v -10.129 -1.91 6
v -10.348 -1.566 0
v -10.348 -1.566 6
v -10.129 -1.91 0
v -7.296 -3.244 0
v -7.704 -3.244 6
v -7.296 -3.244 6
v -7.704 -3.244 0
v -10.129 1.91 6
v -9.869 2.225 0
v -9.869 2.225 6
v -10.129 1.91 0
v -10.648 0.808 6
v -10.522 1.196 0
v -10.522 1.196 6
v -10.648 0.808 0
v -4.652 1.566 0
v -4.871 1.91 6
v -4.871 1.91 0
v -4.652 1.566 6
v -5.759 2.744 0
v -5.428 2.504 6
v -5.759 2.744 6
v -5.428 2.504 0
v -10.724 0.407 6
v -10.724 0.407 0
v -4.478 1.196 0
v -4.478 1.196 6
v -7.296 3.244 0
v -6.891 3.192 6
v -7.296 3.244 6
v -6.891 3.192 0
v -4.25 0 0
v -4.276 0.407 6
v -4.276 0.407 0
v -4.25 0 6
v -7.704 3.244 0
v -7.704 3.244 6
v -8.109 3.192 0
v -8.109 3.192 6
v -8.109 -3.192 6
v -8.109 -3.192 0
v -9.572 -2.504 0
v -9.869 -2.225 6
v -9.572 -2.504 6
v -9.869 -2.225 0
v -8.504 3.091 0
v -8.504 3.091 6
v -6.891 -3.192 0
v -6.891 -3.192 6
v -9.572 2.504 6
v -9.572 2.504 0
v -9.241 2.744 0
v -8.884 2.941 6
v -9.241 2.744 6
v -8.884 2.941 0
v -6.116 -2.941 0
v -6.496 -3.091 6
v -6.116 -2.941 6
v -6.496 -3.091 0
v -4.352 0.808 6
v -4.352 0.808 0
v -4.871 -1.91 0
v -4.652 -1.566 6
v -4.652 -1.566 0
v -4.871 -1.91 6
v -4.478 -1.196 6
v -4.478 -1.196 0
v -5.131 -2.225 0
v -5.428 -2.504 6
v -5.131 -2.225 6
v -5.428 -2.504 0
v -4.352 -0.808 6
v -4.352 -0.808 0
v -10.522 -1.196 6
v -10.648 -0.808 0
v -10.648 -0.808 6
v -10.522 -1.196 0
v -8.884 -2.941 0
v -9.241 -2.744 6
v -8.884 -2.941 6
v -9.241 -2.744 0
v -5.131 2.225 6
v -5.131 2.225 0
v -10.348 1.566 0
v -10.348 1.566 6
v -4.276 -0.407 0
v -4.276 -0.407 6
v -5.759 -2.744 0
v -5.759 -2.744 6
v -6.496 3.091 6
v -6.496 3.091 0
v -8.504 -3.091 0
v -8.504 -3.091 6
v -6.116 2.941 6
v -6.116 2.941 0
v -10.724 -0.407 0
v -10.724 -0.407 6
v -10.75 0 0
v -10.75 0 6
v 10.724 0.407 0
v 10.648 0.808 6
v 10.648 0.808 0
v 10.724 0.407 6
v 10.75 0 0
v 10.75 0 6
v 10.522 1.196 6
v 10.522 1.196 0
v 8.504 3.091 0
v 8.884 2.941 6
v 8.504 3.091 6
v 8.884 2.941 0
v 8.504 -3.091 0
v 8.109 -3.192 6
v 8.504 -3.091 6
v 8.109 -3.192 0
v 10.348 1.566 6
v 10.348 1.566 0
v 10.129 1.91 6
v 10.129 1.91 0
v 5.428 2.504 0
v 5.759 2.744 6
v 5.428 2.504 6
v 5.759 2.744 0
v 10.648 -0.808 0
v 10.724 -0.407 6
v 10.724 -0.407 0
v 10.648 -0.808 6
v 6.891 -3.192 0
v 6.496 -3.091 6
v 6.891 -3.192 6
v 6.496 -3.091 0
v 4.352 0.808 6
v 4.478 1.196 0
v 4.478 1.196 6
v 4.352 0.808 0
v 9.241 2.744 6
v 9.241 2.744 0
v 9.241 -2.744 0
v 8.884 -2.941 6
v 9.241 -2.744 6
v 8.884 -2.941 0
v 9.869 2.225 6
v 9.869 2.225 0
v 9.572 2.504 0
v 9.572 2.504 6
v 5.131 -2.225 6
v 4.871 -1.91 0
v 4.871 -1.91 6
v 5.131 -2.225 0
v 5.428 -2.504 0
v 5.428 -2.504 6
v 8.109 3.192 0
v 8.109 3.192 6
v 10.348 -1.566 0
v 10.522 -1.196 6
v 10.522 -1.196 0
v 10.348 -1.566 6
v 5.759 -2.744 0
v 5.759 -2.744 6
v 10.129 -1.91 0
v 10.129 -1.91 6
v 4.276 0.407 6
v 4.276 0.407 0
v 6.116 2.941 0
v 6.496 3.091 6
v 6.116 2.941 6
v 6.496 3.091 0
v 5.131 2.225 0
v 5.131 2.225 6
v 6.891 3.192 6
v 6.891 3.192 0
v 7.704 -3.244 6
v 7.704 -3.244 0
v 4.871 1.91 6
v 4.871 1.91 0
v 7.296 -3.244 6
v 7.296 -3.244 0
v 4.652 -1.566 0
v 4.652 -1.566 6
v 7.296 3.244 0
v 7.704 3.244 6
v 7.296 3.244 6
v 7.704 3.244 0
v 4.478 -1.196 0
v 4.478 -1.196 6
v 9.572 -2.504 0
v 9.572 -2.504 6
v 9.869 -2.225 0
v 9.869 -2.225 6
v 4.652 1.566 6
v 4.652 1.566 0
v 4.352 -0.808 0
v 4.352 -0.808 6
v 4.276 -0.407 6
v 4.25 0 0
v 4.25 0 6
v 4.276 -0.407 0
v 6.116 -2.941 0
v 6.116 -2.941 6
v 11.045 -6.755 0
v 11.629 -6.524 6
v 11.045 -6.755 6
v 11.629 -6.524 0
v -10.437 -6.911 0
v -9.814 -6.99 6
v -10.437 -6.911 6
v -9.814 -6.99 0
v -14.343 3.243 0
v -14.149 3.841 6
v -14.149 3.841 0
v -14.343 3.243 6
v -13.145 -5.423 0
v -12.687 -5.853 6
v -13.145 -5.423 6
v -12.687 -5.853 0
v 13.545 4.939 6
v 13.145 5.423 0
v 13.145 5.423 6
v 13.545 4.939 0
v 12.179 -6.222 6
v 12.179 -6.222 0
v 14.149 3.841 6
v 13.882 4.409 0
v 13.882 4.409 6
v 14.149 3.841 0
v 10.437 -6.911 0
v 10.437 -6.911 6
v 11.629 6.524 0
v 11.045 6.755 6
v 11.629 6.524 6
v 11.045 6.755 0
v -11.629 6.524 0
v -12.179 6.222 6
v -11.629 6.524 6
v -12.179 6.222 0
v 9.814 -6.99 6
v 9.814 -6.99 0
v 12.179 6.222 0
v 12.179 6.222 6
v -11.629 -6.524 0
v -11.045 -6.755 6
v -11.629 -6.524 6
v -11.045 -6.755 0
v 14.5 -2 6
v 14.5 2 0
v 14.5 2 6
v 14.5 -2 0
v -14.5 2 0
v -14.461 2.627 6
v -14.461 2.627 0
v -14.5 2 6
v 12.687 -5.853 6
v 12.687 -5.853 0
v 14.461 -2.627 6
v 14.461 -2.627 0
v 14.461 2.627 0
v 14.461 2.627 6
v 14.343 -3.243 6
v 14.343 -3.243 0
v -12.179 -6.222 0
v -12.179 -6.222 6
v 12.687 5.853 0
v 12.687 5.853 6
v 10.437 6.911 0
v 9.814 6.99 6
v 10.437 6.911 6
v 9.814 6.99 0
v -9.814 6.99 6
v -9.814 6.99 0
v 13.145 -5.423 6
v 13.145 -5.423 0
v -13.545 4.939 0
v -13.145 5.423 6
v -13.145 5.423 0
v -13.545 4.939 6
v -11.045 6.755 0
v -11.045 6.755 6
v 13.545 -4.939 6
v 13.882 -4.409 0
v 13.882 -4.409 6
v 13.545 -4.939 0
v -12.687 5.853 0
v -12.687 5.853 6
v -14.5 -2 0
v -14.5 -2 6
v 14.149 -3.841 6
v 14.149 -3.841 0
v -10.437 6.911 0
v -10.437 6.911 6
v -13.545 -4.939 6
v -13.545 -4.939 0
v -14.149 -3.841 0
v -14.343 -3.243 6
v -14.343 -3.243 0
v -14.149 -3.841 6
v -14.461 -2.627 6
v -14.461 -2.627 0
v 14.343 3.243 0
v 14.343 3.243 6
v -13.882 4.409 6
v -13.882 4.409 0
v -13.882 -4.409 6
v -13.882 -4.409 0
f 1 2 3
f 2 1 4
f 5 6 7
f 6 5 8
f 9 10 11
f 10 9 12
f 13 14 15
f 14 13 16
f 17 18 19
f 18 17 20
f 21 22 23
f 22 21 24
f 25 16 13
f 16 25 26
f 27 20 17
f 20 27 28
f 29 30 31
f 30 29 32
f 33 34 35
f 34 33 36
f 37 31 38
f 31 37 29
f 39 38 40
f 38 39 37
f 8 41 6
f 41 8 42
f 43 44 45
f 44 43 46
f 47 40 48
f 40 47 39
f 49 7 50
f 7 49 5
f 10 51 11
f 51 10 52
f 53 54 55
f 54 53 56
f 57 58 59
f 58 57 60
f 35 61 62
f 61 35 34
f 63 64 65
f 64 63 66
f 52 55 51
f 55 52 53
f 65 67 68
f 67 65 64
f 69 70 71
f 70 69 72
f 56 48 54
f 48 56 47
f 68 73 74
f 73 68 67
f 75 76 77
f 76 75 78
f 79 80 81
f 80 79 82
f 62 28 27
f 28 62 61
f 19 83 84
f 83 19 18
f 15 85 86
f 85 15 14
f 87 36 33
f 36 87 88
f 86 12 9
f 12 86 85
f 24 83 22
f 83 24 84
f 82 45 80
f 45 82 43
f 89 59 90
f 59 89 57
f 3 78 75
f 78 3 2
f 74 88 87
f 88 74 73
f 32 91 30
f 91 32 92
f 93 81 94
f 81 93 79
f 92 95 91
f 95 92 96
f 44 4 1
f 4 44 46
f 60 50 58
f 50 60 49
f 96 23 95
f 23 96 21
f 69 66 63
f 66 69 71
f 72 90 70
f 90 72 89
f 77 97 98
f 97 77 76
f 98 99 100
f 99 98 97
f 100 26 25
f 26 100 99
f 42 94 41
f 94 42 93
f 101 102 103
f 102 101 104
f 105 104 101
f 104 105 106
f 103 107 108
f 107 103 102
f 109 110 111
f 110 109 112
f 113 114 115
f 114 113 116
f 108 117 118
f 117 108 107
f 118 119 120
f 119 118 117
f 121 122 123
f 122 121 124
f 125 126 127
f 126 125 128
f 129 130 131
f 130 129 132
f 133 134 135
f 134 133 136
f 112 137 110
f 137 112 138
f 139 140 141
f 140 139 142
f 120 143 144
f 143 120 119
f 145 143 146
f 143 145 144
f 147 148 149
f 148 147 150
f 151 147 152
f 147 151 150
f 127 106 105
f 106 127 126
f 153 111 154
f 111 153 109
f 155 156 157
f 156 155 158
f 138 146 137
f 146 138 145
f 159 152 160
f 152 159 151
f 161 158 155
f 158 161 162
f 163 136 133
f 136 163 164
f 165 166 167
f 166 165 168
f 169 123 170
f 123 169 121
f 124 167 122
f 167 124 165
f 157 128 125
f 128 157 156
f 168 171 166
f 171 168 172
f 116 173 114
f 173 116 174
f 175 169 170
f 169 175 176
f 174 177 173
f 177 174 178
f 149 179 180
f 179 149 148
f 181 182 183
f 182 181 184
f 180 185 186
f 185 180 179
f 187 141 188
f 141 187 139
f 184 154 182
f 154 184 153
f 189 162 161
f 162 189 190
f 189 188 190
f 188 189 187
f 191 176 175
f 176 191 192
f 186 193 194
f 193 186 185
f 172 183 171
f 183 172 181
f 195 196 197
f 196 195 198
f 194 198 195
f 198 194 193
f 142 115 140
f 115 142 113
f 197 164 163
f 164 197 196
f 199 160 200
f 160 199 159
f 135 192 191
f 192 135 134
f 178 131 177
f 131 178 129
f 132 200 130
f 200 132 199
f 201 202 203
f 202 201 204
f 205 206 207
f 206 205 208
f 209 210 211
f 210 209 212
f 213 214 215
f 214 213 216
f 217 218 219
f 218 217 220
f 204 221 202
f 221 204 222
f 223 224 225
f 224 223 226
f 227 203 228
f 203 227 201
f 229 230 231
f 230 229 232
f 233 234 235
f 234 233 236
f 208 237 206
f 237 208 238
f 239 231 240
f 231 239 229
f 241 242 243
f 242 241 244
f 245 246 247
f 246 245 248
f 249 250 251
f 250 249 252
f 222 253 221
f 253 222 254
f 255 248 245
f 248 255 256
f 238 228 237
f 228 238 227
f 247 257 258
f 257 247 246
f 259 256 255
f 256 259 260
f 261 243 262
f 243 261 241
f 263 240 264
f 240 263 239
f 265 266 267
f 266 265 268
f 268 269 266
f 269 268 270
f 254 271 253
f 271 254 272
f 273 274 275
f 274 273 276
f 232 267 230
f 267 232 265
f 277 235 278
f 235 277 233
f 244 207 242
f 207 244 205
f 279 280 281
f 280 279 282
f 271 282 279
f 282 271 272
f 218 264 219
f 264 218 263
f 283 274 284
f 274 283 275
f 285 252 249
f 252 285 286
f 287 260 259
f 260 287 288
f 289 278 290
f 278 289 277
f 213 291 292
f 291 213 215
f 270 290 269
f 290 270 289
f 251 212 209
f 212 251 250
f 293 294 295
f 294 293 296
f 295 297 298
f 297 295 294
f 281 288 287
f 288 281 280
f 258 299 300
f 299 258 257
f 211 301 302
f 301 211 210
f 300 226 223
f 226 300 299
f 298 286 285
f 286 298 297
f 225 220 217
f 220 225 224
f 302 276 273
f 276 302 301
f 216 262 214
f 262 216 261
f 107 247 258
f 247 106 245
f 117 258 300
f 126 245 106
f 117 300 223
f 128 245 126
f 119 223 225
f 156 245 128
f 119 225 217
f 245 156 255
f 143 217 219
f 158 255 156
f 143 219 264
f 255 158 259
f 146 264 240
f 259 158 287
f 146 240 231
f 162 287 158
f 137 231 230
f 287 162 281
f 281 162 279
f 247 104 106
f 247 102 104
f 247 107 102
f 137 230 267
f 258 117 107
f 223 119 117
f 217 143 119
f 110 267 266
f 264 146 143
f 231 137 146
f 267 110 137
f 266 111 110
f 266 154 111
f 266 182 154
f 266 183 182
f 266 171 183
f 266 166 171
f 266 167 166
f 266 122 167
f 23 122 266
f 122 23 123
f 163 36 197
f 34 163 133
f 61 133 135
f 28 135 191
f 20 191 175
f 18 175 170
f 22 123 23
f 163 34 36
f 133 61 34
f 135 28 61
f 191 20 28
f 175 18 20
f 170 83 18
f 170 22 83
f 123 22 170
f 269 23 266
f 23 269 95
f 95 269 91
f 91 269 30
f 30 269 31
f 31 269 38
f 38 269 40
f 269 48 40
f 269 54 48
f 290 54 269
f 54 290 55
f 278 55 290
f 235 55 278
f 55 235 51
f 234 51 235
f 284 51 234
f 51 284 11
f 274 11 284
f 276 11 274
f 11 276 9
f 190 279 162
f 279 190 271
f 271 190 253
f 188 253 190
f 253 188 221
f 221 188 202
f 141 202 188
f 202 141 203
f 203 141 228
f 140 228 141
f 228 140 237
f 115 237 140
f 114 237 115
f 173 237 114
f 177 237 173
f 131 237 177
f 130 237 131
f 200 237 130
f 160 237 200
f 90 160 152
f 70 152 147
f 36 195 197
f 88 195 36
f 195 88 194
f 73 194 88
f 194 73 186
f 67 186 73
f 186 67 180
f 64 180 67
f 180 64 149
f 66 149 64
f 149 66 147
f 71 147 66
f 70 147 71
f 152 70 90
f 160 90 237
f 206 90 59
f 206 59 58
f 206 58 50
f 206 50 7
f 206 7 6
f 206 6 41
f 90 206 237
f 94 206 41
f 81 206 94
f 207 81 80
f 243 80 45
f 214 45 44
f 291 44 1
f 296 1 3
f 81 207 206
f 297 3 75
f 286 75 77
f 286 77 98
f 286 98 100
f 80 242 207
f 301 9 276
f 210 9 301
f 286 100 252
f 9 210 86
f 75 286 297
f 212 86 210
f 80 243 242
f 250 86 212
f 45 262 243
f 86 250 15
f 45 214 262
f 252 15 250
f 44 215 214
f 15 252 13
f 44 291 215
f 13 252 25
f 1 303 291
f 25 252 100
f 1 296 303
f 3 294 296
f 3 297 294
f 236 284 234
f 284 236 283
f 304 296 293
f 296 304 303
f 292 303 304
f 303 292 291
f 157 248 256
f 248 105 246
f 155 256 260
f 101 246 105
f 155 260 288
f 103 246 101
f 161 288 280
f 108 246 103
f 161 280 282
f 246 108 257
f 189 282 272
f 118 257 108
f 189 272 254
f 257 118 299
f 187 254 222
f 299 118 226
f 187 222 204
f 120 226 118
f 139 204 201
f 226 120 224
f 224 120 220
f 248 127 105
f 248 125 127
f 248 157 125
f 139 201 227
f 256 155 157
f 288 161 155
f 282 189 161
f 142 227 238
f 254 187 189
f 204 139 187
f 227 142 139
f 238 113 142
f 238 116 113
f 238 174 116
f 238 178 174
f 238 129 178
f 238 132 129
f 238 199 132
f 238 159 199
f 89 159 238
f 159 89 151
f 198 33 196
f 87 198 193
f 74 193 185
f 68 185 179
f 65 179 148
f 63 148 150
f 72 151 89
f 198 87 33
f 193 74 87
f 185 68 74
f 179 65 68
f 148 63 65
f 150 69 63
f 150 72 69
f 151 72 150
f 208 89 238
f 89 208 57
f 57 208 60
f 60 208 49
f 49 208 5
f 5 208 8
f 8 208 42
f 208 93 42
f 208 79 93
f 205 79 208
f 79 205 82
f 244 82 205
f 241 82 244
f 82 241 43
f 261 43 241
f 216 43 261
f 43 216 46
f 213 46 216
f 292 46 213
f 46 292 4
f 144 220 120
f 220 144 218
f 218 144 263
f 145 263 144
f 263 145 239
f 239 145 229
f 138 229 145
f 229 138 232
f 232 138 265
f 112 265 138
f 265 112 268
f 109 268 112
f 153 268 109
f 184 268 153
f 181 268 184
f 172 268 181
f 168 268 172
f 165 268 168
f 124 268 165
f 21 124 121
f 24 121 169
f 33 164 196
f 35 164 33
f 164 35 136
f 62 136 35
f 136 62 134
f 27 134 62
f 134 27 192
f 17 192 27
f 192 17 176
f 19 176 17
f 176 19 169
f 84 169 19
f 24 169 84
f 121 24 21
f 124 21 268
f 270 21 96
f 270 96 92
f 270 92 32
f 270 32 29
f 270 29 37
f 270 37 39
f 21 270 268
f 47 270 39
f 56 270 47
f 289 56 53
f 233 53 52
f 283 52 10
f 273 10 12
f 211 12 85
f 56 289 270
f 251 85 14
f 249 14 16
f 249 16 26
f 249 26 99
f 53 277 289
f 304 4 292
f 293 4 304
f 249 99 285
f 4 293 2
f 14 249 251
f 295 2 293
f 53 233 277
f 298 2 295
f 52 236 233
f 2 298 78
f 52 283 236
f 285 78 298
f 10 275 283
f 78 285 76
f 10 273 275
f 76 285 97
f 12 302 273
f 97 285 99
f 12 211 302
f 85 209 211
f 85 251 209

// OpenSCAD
$fn = 50;


difference() {
	union() {
		hull() {
			translate(v = [-9.5000000000, 2.0000000000, 0]) {
				cylinder(h = 6, r = 5);
			}
			translate(v = [9.5000000000, 2.0000000000, 0]) {
				cylinder(h = 6, r = 5);
			}
			translate(v = [-9.5000000000, -2.0000000000, 0]) {
				cylinder(h = 6, r = 5);
			}
			translate(v = [9.5000000000, -2.0000000000, 0]) {
				cylinder(h = 6, r = 5);
			}
		}
	}
	union() {
		translate(v = [-7.5000000000, 0.0000000000, -100.0000000000]) {
			cylinder(h = 200, r = 3.2500000000);
		}
		translate(v = [-7.5000000000, 0.0000000000, -100.0000000000]) {
			cylinder(h = 200, r = 3.2500000000);
		}
		translate(v = [7.5000000000, 0.0000000000, -100.0000000000]) {
			cylinder(h = 200, r = 3.2500000000);
		}
		translate(v = [7.5000000000, 0.0000000000, -100.0000000000]) {
			cylinder(h = 200, r = 3.2500000000);
		}
	}
}
